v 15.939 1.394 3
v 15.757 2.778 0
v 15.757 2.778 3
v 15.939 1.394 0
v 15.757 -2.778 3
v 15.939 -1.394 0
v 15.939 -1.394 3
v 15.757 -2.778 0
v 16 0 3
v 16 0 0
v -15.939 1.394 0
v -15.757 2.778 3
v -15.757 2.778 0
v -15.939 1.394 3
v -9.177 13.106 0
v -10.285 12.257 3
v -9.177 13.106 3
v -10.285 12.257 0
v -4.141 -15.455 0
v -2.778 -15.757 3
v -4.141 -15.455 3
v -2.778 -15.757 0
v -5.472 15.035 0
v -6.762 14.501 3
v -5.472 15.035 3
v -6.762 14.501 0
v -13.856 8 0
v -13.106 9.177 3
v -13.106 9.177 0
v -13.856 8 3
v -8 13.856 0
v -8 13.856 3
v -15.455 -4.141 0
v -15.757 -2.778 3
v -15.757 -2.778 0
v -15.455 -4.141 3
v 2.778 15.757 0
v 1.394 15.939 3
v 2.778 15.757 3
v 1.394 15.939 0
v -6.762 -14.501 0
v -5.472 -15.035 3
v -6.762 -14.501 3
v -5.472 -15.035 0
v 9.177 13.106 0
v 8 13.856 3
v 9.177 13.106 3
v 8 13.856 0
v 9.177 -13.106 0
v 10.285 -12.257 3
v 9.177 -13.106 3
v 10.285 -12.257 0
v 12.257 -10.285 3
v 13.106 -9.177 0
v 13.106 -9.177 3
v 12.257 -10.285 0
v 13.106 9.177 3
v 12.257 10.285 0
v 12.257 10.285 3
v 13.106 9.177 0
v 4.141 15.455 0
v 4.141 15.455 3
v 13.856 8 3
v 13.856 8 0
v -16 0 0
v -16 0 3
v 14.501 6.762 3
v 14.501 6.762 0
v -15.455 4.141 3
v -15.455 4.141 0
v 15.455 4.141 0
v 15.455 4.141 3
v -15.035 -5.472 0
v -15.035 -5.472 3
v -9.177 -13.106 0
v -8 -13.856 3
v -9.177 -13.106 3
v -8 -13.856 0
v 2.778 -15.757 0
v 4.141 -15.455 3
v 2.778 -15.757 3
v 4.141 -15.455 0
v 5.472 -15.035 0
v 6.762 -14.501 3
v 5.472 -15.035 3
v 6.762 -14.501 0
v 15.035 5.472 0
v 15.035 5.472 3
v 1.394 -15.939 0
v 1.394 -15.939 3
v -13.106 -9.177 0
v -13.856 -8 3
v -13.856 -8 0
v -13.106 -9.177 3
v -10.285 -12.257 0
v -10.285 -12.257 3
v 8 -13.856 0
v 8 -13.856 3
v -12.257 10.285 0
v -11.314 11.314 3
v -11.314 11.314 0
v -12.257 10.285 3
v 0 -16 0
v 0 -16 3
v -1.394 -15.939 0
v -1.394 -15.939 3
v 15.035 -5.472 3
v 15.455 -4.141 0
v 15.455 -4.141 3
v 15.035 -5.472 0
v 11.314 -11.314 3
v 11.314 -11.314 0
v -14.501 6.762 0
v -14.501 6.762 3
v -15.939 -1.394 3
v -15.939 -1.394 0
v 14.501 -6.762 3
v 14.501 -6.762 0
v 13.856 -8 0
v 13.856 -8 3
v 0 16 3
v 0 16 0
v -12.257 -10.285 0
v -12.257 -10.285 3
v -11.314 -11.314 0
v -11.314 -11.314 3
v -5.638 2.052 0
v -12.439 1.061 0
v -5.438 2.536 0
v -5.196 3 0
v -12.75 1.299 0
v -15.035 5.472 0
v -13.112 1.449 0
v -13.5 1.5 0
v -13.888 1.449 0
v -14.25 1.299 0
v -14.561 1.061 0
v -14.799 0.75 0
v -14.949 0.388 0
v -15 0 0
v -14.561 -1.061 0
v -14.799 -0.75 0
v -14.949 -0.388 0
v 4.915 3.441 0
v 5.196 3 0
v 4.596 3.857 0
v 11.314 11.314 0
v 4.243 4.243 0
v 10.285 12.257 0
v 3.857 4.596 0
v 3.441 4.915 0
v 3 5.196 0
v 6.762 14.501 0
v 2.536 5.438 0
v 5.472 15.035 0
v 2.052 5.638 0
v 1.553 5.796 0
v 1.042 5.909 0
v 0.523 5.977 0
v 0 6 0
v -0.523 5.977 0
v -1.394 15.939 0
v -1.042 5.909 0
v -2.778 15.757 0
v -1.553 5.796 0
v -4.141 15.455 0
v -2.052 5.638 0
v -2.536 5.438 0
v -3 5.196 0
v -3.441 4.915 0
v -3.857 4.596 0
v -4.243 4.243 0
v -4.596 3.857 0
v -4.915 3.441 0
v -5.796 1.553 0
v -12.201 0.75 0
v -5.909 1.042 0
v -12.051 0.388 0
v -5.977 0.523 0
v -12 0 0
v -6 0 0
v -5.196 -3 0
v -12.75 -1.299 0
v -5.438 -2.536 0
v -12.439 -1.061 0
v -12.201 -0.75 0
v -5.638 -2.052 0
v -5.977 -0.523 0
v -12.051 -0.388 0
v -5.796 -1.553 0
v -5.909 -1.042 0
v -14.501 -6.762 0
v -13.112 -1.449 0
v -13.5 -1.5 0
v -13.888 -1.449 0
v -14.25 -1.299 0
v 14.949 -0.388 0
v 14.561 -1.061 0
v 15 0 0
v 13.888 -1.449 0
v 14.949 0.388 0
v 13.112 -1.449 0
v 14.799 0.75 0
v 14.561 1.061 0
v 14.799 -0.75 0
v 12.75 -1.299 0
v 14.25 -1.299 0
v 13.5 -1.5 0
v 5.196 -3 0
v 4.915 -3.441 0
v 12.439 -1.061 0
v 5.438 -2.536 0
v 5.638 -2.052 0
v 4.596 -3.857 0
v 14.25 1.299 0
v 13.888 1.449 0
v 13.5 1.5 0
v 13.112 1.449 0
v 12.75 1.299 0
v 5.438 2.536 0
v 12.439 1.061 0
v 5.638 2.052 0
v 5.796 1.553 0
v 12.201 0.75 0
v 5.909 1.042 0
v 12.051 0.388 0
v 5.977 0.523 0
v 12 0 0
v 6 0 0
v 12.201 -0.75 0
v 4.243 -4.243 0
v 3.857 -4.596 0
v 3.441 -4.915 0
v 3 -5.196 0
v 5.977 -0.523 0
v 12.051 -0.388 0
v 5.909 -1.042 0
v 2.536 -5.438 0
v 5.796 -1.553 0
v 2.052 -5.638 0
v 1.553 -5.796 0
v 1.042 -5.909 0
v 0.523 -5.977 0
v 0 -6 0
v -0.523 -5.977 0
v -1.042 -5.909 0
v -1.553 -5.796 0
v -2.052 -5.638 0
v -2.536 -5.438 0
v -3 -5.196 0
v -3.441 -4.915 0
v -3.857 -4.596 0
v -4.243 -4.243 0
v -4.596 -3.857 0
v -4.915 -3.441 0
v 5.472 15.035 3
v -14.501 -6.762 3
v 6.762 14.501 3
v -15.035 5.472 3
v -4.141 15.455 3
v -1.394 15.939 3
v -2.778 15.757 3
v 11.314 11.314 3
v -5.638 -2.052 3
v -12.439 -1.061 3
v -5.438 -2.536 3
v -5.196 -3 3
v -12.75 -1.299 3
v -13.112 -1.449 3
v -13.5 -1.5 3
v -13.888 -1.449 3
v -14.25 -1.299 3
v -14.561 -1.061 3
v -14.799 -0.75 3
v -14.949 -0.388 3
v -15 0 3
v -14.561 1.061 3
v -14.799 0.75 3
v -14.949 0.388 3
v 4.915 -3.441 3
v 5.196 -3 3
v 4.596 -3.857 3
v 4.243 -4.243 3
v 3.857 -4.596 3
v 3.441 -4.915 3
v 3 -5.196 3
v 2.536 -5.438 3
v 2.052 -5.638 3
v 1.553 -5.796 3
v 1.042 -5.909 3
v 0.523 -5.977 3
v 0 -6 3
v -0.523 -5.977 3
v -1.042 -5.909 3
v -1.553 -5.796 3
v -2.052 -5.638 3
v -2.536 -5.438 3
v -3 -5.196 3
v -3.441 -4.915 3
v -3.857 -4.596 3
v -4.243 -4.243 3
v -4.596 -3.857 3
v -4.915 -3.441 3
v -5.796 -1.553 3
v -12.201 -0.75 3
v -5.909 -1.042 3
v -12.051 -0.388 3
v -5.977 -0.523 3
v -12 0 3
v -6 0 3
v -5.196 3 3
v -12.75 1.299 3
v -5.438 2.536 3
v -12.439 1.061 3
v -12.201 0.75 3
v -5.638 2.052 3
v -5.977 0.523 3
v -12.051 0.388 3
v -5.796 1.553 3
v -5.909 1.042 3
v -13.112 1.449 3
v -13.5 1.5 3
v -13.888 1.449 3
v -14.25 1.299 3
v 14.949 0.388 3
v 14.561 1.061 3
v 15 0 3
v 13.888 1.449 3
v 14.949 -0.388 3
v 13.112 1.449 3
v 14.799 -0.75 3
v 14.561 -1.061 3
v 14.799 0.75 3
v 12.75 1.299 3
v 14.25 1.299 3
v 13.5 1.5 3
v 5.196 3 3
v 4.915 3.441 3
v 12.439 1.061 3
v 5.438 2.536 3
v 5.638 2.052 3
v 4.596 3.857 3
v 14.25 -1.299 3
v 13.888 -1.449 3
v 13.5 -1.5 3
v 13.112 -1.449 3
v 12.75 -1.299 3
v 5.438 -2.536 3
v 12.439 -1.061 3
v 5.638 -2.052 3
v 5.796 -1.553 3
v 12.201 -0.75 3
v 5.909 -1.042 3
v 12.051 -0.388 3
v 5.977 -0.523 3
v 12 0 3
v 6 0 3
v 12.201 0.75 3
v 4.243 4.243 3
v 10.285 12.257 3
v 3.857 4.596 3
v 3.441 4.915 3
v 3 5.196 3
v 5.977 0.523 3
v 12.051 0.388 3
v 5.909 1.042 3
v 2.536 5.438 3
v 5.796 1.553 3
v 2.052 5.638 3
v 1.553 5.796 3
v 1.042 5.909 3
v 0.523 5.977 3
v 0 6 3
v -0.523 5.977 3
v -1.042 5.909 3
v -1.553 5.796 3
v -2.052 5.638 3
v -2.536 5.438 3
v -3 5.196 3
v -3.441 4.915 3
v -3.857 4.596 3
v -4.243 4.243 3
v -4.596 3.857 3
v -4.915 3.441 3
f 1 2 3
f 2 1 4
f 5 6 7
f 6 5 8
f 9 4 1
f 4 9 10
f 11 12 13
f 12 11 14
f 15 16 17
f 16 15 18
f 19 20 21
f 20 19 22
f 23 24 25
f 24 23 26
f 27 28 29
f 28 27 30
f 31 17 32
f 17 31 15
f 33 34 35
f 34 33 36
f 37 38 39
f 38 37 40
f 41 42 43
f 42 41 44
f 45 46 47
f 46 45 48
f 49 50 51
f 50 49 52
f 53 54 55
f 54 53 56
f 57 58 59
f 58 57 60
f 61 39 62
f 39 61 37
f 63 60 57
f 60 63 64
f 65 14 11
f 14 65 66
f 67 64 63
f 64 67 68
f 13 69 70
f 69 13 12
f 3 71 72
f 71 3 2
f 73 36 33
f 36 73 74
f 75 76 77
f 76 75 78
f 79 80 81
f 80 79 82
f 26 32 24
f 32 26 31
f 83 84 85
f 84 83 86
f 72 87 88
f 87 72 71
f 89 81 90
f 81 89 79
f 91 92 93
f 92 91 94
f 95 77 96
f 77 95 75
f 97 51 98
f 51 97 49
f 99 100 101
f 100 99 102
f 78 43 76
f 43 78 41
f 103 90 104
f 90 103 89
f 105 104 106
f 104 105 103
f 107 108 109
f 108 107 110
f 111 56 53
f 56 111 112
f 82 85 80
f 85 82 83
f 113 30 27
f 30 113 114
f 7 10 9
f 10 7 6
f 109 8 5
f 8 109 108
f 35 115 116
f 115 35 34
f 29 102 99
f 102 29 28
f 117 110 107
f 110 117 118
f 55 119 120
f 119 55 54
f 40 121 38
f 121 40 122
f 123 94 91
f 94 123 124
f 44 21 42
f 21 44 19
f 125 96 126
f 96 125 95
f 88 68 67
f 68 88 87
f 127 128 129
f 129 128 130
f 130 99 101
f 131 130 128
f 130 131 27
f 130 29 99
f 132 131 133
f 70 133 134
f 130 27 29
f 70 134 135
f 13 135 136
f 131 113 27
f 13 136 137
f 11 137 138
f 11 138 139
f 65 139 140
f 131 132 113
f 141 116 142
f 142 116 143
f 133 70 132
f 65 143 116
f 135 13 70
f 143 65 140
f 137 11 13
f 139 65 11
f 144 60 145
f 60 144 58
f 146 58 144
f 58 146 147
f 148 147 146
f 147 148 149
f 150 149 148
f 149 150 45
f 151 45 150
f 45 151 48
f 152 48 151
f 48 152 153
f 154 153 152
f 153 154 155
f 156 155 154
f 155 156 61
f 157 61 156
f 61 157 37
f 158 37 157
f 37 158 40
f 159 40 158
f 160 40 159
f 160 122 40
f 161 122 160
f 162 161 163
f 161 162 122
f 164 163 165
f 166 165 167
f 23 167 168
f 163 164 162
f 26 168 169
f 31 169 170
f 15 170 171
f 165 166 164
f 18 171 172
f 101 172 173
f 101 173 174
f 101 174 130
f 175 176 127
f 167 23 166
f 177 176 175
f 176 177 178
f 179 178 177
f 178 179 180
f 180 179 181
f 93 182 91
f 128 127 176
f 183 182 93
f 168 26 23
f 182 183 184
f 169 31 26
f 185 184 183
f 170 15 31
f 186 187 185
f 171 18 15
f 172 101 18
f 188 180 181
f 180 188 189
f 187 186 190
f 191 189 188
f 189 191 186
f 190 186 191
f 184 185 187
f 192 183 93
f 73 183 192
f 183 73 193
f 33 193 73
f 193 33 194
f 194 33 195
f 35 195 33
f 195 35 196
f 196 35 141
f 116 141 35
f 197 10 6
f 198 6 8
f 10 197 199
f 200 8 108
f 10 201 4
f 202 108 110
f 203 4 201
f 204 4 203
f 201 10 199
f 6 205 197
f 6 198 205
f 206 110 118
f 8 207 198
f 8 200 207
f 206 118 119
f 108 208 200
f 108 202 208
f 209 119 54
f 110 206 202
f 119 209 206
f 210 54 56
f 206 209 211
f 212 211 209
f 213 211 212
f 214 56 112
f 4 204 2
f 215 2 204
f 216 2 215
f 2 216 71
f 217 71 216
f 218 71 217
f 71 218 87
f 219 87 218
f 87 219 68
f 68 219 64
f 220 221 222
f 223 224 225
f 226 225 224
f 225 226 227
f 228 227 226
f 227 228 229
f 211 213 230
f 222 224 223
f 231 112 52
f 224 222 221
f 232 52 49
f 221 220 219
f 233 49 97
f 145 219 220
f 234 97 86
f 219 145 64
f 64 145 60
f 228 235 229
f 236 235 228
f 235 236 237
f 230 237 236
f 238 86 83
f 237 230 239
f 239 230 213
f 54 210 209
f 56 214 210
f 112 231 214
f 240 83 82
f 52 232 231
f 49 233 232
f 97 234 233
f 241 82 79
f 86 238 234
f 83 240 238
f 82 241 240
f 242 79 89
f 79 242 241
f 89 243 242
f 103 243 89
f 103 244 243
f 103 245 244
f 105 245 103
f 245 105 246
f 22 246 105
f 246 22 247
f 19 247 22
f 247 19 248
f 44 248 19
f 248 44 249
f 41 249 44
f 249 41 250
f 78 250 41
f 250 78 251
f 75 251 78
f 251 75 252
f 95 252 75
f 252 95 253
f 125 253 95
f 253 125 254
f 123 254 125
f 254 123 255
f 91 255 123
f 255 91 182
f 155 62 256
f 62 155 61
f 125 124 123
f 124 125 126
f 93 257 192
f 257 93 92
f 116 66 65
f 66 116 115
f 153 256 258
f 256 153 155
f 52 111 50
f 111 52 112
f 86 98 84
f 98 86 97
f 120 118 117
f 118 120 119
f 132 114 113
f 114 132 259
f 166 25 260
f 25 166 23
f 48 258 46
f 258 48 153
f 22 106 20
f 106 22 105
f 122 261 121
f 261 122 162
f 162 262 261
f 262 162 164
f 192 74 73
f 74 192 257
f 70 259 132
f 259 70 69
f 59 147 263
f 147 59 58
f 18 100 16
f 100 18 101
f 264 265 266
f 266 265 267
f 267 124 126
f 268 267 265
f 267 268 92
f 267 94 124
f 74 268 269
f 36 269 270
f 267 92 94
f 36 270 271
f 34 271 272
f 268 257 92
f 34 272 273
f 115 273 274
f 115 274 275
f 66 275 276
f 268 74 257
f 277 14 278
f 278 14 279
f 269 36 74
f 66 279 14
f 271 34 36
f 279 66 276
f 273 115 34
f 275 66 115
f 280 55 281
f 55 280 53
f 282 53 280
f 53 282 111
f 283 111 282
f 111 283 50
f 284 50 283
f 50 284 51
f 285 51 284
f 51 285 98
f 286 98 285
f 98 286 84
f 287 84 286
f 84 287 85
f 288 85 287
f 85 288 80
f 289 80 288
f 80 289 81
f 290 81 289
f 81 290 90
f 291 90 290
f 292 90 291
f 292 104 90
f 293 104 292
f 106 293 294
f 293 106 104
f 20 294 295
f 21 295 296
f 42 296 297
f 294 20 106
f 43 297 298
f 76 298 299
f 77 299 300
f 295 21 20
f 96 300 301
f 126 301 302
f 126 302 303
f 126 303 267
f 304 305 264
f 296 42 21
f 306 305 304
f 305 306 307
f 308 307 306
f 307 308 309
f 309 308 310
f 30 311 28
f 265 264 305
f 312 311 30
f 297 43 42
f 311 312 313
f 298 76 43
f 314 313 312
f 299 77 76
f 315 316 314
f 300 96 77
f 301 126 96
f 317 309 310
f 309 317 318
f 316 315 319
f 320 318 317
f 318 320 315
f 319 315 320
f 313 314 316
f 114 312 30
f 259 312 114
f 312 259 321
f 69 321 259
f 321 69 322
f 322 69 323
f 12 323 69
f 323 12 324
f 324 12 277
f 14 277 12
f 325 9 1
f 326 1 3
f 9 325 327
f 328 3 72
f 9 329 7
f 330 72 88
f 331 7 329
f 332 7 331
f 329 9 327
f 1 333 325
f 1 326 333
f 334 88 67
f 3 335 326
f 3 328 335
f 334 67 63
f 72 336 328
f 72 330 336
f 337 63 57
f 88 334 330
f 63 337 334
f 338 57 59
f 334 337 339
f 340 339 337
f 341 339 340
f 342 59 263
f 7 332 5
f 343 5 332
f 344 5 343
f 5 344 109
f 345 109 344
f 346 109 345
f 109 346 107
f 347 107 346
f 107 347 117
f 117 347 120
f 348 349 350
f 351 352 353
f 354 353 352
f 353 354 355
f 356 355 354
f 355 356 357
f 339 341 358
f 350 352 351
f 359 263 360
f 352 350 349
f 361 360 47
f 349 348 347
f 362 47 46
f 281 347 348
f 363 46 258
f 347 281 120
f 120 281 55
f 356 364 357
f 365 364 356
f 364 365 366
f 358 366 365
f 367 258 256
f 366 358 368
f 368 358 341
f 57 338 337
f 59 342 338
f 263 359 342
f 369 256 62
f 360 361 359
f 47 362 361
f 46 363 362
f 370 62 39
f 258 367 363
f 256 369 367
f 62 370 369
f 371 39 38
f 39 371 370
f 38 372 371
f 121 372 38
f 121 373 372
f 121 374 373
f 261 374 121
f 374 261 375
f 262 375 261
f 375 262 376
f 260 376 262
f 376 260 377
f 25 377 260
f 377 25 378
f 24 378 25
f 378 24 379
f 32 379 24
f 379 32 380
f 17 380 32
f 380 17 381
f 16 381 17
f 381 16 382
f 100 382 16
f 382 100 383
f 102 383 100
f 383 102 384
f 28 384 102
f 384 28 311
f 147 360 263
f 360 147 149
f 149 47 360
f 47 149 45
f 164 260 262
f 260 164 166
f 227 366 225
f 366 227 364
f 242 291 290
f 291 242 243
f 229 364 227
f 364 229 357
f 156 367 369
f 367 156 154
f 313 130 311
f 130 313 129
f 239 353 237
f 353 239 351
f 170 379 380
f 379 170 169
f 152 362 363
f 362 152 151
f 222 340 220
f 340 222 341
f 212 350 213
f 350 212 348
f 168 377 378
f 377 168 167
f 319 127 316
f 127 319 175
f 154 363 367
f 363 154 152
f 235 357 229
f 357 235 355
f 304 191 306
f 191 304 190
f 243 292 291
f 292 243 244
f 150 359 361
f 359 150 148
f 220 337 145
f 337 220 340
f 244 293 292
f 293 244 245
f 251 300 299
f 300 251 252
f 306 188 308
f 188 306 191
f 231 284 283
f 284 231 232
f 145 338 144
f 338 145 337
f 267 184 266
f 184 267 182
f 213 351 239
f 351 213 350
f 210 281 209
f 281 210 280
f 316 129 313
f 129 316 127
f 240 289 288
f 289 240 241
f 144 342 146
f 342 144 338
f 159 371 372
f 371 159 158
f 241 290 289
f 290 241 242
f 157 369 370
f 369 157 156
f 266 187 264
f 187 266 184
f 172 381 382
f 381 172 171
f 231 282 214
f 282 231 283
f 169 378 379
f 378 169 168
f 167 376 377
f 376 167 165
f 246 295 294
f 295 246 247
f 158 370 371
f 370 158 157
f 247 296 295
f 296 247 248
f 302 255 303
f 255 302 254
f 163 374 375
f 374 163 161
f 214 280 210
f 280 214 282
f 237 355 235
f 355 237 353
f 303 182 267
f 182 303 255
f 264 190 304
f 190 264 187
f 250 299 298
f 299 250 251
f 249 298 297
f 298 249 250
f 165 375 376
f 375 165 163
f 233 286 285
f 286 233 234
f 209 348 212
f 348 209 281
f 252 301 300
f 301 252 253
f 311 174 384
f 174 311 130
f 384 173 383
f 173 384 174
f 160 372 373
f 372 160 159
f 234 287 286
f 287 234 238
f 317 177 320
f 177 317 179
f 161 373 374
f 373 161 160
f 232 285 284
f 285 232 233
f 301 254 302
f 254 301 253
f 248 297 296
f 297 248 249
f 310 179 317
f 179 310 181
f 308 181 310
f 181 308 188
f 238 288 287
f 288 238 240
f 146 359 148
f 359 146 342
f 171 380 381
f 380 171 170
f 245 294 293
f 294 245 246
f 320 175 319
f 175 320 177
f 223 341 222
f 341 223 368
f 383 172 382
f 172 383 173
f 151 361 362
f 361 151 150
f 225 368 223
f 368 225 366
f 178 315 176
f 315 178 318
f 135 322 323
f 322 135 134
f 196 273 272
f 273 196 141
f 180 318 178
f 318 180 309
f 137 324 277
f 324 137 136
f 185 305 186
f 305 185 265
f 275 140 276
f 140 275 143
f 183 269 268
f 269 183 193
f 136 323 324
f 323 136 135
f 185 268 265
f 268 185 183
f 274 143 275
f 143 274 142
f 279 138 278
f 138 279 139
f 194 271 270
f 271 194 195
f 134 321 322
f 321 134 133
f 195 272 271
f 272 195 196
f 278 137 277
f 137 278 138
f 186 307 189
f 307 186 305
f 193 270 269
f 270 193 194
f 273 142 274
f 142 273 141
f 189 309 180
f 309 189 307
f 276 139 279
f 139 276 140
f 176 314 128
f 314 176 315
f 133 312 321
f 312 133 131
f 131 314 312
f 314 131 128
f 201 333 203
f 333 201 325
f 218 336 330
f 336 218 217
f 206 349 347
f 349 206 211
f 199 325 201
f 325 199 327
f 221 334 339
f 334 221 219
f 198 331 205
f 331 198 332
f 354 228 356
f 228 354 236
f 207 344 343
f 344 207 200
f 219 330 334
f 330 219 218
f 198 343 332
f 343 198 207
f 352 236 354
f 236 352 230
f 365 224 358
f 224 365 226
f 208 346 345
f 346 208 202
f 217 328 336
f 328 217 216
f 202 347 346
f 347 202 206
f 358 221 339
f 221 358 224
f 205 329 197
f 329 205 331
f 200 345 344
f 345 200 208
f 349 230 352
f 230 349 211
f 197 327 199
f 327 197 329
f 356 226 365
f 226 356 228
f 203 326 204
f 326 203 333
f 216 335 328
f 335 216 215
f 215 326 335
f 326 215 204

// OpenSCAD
//$fn=60;
$fa=5;
$fs=.4;

difference(){
    linear_extrude(height=3) circle(d=32);
    translate([0,0,-1]) linear_extrude(height=10) circle(d=12);
    antirot_hole(-27/2);
    antirot_hole(27/2);
}

module antirot_hole(x=0){
    translate([x,0,-1]) linear_extrude(height=10) circle(d=3);
}
